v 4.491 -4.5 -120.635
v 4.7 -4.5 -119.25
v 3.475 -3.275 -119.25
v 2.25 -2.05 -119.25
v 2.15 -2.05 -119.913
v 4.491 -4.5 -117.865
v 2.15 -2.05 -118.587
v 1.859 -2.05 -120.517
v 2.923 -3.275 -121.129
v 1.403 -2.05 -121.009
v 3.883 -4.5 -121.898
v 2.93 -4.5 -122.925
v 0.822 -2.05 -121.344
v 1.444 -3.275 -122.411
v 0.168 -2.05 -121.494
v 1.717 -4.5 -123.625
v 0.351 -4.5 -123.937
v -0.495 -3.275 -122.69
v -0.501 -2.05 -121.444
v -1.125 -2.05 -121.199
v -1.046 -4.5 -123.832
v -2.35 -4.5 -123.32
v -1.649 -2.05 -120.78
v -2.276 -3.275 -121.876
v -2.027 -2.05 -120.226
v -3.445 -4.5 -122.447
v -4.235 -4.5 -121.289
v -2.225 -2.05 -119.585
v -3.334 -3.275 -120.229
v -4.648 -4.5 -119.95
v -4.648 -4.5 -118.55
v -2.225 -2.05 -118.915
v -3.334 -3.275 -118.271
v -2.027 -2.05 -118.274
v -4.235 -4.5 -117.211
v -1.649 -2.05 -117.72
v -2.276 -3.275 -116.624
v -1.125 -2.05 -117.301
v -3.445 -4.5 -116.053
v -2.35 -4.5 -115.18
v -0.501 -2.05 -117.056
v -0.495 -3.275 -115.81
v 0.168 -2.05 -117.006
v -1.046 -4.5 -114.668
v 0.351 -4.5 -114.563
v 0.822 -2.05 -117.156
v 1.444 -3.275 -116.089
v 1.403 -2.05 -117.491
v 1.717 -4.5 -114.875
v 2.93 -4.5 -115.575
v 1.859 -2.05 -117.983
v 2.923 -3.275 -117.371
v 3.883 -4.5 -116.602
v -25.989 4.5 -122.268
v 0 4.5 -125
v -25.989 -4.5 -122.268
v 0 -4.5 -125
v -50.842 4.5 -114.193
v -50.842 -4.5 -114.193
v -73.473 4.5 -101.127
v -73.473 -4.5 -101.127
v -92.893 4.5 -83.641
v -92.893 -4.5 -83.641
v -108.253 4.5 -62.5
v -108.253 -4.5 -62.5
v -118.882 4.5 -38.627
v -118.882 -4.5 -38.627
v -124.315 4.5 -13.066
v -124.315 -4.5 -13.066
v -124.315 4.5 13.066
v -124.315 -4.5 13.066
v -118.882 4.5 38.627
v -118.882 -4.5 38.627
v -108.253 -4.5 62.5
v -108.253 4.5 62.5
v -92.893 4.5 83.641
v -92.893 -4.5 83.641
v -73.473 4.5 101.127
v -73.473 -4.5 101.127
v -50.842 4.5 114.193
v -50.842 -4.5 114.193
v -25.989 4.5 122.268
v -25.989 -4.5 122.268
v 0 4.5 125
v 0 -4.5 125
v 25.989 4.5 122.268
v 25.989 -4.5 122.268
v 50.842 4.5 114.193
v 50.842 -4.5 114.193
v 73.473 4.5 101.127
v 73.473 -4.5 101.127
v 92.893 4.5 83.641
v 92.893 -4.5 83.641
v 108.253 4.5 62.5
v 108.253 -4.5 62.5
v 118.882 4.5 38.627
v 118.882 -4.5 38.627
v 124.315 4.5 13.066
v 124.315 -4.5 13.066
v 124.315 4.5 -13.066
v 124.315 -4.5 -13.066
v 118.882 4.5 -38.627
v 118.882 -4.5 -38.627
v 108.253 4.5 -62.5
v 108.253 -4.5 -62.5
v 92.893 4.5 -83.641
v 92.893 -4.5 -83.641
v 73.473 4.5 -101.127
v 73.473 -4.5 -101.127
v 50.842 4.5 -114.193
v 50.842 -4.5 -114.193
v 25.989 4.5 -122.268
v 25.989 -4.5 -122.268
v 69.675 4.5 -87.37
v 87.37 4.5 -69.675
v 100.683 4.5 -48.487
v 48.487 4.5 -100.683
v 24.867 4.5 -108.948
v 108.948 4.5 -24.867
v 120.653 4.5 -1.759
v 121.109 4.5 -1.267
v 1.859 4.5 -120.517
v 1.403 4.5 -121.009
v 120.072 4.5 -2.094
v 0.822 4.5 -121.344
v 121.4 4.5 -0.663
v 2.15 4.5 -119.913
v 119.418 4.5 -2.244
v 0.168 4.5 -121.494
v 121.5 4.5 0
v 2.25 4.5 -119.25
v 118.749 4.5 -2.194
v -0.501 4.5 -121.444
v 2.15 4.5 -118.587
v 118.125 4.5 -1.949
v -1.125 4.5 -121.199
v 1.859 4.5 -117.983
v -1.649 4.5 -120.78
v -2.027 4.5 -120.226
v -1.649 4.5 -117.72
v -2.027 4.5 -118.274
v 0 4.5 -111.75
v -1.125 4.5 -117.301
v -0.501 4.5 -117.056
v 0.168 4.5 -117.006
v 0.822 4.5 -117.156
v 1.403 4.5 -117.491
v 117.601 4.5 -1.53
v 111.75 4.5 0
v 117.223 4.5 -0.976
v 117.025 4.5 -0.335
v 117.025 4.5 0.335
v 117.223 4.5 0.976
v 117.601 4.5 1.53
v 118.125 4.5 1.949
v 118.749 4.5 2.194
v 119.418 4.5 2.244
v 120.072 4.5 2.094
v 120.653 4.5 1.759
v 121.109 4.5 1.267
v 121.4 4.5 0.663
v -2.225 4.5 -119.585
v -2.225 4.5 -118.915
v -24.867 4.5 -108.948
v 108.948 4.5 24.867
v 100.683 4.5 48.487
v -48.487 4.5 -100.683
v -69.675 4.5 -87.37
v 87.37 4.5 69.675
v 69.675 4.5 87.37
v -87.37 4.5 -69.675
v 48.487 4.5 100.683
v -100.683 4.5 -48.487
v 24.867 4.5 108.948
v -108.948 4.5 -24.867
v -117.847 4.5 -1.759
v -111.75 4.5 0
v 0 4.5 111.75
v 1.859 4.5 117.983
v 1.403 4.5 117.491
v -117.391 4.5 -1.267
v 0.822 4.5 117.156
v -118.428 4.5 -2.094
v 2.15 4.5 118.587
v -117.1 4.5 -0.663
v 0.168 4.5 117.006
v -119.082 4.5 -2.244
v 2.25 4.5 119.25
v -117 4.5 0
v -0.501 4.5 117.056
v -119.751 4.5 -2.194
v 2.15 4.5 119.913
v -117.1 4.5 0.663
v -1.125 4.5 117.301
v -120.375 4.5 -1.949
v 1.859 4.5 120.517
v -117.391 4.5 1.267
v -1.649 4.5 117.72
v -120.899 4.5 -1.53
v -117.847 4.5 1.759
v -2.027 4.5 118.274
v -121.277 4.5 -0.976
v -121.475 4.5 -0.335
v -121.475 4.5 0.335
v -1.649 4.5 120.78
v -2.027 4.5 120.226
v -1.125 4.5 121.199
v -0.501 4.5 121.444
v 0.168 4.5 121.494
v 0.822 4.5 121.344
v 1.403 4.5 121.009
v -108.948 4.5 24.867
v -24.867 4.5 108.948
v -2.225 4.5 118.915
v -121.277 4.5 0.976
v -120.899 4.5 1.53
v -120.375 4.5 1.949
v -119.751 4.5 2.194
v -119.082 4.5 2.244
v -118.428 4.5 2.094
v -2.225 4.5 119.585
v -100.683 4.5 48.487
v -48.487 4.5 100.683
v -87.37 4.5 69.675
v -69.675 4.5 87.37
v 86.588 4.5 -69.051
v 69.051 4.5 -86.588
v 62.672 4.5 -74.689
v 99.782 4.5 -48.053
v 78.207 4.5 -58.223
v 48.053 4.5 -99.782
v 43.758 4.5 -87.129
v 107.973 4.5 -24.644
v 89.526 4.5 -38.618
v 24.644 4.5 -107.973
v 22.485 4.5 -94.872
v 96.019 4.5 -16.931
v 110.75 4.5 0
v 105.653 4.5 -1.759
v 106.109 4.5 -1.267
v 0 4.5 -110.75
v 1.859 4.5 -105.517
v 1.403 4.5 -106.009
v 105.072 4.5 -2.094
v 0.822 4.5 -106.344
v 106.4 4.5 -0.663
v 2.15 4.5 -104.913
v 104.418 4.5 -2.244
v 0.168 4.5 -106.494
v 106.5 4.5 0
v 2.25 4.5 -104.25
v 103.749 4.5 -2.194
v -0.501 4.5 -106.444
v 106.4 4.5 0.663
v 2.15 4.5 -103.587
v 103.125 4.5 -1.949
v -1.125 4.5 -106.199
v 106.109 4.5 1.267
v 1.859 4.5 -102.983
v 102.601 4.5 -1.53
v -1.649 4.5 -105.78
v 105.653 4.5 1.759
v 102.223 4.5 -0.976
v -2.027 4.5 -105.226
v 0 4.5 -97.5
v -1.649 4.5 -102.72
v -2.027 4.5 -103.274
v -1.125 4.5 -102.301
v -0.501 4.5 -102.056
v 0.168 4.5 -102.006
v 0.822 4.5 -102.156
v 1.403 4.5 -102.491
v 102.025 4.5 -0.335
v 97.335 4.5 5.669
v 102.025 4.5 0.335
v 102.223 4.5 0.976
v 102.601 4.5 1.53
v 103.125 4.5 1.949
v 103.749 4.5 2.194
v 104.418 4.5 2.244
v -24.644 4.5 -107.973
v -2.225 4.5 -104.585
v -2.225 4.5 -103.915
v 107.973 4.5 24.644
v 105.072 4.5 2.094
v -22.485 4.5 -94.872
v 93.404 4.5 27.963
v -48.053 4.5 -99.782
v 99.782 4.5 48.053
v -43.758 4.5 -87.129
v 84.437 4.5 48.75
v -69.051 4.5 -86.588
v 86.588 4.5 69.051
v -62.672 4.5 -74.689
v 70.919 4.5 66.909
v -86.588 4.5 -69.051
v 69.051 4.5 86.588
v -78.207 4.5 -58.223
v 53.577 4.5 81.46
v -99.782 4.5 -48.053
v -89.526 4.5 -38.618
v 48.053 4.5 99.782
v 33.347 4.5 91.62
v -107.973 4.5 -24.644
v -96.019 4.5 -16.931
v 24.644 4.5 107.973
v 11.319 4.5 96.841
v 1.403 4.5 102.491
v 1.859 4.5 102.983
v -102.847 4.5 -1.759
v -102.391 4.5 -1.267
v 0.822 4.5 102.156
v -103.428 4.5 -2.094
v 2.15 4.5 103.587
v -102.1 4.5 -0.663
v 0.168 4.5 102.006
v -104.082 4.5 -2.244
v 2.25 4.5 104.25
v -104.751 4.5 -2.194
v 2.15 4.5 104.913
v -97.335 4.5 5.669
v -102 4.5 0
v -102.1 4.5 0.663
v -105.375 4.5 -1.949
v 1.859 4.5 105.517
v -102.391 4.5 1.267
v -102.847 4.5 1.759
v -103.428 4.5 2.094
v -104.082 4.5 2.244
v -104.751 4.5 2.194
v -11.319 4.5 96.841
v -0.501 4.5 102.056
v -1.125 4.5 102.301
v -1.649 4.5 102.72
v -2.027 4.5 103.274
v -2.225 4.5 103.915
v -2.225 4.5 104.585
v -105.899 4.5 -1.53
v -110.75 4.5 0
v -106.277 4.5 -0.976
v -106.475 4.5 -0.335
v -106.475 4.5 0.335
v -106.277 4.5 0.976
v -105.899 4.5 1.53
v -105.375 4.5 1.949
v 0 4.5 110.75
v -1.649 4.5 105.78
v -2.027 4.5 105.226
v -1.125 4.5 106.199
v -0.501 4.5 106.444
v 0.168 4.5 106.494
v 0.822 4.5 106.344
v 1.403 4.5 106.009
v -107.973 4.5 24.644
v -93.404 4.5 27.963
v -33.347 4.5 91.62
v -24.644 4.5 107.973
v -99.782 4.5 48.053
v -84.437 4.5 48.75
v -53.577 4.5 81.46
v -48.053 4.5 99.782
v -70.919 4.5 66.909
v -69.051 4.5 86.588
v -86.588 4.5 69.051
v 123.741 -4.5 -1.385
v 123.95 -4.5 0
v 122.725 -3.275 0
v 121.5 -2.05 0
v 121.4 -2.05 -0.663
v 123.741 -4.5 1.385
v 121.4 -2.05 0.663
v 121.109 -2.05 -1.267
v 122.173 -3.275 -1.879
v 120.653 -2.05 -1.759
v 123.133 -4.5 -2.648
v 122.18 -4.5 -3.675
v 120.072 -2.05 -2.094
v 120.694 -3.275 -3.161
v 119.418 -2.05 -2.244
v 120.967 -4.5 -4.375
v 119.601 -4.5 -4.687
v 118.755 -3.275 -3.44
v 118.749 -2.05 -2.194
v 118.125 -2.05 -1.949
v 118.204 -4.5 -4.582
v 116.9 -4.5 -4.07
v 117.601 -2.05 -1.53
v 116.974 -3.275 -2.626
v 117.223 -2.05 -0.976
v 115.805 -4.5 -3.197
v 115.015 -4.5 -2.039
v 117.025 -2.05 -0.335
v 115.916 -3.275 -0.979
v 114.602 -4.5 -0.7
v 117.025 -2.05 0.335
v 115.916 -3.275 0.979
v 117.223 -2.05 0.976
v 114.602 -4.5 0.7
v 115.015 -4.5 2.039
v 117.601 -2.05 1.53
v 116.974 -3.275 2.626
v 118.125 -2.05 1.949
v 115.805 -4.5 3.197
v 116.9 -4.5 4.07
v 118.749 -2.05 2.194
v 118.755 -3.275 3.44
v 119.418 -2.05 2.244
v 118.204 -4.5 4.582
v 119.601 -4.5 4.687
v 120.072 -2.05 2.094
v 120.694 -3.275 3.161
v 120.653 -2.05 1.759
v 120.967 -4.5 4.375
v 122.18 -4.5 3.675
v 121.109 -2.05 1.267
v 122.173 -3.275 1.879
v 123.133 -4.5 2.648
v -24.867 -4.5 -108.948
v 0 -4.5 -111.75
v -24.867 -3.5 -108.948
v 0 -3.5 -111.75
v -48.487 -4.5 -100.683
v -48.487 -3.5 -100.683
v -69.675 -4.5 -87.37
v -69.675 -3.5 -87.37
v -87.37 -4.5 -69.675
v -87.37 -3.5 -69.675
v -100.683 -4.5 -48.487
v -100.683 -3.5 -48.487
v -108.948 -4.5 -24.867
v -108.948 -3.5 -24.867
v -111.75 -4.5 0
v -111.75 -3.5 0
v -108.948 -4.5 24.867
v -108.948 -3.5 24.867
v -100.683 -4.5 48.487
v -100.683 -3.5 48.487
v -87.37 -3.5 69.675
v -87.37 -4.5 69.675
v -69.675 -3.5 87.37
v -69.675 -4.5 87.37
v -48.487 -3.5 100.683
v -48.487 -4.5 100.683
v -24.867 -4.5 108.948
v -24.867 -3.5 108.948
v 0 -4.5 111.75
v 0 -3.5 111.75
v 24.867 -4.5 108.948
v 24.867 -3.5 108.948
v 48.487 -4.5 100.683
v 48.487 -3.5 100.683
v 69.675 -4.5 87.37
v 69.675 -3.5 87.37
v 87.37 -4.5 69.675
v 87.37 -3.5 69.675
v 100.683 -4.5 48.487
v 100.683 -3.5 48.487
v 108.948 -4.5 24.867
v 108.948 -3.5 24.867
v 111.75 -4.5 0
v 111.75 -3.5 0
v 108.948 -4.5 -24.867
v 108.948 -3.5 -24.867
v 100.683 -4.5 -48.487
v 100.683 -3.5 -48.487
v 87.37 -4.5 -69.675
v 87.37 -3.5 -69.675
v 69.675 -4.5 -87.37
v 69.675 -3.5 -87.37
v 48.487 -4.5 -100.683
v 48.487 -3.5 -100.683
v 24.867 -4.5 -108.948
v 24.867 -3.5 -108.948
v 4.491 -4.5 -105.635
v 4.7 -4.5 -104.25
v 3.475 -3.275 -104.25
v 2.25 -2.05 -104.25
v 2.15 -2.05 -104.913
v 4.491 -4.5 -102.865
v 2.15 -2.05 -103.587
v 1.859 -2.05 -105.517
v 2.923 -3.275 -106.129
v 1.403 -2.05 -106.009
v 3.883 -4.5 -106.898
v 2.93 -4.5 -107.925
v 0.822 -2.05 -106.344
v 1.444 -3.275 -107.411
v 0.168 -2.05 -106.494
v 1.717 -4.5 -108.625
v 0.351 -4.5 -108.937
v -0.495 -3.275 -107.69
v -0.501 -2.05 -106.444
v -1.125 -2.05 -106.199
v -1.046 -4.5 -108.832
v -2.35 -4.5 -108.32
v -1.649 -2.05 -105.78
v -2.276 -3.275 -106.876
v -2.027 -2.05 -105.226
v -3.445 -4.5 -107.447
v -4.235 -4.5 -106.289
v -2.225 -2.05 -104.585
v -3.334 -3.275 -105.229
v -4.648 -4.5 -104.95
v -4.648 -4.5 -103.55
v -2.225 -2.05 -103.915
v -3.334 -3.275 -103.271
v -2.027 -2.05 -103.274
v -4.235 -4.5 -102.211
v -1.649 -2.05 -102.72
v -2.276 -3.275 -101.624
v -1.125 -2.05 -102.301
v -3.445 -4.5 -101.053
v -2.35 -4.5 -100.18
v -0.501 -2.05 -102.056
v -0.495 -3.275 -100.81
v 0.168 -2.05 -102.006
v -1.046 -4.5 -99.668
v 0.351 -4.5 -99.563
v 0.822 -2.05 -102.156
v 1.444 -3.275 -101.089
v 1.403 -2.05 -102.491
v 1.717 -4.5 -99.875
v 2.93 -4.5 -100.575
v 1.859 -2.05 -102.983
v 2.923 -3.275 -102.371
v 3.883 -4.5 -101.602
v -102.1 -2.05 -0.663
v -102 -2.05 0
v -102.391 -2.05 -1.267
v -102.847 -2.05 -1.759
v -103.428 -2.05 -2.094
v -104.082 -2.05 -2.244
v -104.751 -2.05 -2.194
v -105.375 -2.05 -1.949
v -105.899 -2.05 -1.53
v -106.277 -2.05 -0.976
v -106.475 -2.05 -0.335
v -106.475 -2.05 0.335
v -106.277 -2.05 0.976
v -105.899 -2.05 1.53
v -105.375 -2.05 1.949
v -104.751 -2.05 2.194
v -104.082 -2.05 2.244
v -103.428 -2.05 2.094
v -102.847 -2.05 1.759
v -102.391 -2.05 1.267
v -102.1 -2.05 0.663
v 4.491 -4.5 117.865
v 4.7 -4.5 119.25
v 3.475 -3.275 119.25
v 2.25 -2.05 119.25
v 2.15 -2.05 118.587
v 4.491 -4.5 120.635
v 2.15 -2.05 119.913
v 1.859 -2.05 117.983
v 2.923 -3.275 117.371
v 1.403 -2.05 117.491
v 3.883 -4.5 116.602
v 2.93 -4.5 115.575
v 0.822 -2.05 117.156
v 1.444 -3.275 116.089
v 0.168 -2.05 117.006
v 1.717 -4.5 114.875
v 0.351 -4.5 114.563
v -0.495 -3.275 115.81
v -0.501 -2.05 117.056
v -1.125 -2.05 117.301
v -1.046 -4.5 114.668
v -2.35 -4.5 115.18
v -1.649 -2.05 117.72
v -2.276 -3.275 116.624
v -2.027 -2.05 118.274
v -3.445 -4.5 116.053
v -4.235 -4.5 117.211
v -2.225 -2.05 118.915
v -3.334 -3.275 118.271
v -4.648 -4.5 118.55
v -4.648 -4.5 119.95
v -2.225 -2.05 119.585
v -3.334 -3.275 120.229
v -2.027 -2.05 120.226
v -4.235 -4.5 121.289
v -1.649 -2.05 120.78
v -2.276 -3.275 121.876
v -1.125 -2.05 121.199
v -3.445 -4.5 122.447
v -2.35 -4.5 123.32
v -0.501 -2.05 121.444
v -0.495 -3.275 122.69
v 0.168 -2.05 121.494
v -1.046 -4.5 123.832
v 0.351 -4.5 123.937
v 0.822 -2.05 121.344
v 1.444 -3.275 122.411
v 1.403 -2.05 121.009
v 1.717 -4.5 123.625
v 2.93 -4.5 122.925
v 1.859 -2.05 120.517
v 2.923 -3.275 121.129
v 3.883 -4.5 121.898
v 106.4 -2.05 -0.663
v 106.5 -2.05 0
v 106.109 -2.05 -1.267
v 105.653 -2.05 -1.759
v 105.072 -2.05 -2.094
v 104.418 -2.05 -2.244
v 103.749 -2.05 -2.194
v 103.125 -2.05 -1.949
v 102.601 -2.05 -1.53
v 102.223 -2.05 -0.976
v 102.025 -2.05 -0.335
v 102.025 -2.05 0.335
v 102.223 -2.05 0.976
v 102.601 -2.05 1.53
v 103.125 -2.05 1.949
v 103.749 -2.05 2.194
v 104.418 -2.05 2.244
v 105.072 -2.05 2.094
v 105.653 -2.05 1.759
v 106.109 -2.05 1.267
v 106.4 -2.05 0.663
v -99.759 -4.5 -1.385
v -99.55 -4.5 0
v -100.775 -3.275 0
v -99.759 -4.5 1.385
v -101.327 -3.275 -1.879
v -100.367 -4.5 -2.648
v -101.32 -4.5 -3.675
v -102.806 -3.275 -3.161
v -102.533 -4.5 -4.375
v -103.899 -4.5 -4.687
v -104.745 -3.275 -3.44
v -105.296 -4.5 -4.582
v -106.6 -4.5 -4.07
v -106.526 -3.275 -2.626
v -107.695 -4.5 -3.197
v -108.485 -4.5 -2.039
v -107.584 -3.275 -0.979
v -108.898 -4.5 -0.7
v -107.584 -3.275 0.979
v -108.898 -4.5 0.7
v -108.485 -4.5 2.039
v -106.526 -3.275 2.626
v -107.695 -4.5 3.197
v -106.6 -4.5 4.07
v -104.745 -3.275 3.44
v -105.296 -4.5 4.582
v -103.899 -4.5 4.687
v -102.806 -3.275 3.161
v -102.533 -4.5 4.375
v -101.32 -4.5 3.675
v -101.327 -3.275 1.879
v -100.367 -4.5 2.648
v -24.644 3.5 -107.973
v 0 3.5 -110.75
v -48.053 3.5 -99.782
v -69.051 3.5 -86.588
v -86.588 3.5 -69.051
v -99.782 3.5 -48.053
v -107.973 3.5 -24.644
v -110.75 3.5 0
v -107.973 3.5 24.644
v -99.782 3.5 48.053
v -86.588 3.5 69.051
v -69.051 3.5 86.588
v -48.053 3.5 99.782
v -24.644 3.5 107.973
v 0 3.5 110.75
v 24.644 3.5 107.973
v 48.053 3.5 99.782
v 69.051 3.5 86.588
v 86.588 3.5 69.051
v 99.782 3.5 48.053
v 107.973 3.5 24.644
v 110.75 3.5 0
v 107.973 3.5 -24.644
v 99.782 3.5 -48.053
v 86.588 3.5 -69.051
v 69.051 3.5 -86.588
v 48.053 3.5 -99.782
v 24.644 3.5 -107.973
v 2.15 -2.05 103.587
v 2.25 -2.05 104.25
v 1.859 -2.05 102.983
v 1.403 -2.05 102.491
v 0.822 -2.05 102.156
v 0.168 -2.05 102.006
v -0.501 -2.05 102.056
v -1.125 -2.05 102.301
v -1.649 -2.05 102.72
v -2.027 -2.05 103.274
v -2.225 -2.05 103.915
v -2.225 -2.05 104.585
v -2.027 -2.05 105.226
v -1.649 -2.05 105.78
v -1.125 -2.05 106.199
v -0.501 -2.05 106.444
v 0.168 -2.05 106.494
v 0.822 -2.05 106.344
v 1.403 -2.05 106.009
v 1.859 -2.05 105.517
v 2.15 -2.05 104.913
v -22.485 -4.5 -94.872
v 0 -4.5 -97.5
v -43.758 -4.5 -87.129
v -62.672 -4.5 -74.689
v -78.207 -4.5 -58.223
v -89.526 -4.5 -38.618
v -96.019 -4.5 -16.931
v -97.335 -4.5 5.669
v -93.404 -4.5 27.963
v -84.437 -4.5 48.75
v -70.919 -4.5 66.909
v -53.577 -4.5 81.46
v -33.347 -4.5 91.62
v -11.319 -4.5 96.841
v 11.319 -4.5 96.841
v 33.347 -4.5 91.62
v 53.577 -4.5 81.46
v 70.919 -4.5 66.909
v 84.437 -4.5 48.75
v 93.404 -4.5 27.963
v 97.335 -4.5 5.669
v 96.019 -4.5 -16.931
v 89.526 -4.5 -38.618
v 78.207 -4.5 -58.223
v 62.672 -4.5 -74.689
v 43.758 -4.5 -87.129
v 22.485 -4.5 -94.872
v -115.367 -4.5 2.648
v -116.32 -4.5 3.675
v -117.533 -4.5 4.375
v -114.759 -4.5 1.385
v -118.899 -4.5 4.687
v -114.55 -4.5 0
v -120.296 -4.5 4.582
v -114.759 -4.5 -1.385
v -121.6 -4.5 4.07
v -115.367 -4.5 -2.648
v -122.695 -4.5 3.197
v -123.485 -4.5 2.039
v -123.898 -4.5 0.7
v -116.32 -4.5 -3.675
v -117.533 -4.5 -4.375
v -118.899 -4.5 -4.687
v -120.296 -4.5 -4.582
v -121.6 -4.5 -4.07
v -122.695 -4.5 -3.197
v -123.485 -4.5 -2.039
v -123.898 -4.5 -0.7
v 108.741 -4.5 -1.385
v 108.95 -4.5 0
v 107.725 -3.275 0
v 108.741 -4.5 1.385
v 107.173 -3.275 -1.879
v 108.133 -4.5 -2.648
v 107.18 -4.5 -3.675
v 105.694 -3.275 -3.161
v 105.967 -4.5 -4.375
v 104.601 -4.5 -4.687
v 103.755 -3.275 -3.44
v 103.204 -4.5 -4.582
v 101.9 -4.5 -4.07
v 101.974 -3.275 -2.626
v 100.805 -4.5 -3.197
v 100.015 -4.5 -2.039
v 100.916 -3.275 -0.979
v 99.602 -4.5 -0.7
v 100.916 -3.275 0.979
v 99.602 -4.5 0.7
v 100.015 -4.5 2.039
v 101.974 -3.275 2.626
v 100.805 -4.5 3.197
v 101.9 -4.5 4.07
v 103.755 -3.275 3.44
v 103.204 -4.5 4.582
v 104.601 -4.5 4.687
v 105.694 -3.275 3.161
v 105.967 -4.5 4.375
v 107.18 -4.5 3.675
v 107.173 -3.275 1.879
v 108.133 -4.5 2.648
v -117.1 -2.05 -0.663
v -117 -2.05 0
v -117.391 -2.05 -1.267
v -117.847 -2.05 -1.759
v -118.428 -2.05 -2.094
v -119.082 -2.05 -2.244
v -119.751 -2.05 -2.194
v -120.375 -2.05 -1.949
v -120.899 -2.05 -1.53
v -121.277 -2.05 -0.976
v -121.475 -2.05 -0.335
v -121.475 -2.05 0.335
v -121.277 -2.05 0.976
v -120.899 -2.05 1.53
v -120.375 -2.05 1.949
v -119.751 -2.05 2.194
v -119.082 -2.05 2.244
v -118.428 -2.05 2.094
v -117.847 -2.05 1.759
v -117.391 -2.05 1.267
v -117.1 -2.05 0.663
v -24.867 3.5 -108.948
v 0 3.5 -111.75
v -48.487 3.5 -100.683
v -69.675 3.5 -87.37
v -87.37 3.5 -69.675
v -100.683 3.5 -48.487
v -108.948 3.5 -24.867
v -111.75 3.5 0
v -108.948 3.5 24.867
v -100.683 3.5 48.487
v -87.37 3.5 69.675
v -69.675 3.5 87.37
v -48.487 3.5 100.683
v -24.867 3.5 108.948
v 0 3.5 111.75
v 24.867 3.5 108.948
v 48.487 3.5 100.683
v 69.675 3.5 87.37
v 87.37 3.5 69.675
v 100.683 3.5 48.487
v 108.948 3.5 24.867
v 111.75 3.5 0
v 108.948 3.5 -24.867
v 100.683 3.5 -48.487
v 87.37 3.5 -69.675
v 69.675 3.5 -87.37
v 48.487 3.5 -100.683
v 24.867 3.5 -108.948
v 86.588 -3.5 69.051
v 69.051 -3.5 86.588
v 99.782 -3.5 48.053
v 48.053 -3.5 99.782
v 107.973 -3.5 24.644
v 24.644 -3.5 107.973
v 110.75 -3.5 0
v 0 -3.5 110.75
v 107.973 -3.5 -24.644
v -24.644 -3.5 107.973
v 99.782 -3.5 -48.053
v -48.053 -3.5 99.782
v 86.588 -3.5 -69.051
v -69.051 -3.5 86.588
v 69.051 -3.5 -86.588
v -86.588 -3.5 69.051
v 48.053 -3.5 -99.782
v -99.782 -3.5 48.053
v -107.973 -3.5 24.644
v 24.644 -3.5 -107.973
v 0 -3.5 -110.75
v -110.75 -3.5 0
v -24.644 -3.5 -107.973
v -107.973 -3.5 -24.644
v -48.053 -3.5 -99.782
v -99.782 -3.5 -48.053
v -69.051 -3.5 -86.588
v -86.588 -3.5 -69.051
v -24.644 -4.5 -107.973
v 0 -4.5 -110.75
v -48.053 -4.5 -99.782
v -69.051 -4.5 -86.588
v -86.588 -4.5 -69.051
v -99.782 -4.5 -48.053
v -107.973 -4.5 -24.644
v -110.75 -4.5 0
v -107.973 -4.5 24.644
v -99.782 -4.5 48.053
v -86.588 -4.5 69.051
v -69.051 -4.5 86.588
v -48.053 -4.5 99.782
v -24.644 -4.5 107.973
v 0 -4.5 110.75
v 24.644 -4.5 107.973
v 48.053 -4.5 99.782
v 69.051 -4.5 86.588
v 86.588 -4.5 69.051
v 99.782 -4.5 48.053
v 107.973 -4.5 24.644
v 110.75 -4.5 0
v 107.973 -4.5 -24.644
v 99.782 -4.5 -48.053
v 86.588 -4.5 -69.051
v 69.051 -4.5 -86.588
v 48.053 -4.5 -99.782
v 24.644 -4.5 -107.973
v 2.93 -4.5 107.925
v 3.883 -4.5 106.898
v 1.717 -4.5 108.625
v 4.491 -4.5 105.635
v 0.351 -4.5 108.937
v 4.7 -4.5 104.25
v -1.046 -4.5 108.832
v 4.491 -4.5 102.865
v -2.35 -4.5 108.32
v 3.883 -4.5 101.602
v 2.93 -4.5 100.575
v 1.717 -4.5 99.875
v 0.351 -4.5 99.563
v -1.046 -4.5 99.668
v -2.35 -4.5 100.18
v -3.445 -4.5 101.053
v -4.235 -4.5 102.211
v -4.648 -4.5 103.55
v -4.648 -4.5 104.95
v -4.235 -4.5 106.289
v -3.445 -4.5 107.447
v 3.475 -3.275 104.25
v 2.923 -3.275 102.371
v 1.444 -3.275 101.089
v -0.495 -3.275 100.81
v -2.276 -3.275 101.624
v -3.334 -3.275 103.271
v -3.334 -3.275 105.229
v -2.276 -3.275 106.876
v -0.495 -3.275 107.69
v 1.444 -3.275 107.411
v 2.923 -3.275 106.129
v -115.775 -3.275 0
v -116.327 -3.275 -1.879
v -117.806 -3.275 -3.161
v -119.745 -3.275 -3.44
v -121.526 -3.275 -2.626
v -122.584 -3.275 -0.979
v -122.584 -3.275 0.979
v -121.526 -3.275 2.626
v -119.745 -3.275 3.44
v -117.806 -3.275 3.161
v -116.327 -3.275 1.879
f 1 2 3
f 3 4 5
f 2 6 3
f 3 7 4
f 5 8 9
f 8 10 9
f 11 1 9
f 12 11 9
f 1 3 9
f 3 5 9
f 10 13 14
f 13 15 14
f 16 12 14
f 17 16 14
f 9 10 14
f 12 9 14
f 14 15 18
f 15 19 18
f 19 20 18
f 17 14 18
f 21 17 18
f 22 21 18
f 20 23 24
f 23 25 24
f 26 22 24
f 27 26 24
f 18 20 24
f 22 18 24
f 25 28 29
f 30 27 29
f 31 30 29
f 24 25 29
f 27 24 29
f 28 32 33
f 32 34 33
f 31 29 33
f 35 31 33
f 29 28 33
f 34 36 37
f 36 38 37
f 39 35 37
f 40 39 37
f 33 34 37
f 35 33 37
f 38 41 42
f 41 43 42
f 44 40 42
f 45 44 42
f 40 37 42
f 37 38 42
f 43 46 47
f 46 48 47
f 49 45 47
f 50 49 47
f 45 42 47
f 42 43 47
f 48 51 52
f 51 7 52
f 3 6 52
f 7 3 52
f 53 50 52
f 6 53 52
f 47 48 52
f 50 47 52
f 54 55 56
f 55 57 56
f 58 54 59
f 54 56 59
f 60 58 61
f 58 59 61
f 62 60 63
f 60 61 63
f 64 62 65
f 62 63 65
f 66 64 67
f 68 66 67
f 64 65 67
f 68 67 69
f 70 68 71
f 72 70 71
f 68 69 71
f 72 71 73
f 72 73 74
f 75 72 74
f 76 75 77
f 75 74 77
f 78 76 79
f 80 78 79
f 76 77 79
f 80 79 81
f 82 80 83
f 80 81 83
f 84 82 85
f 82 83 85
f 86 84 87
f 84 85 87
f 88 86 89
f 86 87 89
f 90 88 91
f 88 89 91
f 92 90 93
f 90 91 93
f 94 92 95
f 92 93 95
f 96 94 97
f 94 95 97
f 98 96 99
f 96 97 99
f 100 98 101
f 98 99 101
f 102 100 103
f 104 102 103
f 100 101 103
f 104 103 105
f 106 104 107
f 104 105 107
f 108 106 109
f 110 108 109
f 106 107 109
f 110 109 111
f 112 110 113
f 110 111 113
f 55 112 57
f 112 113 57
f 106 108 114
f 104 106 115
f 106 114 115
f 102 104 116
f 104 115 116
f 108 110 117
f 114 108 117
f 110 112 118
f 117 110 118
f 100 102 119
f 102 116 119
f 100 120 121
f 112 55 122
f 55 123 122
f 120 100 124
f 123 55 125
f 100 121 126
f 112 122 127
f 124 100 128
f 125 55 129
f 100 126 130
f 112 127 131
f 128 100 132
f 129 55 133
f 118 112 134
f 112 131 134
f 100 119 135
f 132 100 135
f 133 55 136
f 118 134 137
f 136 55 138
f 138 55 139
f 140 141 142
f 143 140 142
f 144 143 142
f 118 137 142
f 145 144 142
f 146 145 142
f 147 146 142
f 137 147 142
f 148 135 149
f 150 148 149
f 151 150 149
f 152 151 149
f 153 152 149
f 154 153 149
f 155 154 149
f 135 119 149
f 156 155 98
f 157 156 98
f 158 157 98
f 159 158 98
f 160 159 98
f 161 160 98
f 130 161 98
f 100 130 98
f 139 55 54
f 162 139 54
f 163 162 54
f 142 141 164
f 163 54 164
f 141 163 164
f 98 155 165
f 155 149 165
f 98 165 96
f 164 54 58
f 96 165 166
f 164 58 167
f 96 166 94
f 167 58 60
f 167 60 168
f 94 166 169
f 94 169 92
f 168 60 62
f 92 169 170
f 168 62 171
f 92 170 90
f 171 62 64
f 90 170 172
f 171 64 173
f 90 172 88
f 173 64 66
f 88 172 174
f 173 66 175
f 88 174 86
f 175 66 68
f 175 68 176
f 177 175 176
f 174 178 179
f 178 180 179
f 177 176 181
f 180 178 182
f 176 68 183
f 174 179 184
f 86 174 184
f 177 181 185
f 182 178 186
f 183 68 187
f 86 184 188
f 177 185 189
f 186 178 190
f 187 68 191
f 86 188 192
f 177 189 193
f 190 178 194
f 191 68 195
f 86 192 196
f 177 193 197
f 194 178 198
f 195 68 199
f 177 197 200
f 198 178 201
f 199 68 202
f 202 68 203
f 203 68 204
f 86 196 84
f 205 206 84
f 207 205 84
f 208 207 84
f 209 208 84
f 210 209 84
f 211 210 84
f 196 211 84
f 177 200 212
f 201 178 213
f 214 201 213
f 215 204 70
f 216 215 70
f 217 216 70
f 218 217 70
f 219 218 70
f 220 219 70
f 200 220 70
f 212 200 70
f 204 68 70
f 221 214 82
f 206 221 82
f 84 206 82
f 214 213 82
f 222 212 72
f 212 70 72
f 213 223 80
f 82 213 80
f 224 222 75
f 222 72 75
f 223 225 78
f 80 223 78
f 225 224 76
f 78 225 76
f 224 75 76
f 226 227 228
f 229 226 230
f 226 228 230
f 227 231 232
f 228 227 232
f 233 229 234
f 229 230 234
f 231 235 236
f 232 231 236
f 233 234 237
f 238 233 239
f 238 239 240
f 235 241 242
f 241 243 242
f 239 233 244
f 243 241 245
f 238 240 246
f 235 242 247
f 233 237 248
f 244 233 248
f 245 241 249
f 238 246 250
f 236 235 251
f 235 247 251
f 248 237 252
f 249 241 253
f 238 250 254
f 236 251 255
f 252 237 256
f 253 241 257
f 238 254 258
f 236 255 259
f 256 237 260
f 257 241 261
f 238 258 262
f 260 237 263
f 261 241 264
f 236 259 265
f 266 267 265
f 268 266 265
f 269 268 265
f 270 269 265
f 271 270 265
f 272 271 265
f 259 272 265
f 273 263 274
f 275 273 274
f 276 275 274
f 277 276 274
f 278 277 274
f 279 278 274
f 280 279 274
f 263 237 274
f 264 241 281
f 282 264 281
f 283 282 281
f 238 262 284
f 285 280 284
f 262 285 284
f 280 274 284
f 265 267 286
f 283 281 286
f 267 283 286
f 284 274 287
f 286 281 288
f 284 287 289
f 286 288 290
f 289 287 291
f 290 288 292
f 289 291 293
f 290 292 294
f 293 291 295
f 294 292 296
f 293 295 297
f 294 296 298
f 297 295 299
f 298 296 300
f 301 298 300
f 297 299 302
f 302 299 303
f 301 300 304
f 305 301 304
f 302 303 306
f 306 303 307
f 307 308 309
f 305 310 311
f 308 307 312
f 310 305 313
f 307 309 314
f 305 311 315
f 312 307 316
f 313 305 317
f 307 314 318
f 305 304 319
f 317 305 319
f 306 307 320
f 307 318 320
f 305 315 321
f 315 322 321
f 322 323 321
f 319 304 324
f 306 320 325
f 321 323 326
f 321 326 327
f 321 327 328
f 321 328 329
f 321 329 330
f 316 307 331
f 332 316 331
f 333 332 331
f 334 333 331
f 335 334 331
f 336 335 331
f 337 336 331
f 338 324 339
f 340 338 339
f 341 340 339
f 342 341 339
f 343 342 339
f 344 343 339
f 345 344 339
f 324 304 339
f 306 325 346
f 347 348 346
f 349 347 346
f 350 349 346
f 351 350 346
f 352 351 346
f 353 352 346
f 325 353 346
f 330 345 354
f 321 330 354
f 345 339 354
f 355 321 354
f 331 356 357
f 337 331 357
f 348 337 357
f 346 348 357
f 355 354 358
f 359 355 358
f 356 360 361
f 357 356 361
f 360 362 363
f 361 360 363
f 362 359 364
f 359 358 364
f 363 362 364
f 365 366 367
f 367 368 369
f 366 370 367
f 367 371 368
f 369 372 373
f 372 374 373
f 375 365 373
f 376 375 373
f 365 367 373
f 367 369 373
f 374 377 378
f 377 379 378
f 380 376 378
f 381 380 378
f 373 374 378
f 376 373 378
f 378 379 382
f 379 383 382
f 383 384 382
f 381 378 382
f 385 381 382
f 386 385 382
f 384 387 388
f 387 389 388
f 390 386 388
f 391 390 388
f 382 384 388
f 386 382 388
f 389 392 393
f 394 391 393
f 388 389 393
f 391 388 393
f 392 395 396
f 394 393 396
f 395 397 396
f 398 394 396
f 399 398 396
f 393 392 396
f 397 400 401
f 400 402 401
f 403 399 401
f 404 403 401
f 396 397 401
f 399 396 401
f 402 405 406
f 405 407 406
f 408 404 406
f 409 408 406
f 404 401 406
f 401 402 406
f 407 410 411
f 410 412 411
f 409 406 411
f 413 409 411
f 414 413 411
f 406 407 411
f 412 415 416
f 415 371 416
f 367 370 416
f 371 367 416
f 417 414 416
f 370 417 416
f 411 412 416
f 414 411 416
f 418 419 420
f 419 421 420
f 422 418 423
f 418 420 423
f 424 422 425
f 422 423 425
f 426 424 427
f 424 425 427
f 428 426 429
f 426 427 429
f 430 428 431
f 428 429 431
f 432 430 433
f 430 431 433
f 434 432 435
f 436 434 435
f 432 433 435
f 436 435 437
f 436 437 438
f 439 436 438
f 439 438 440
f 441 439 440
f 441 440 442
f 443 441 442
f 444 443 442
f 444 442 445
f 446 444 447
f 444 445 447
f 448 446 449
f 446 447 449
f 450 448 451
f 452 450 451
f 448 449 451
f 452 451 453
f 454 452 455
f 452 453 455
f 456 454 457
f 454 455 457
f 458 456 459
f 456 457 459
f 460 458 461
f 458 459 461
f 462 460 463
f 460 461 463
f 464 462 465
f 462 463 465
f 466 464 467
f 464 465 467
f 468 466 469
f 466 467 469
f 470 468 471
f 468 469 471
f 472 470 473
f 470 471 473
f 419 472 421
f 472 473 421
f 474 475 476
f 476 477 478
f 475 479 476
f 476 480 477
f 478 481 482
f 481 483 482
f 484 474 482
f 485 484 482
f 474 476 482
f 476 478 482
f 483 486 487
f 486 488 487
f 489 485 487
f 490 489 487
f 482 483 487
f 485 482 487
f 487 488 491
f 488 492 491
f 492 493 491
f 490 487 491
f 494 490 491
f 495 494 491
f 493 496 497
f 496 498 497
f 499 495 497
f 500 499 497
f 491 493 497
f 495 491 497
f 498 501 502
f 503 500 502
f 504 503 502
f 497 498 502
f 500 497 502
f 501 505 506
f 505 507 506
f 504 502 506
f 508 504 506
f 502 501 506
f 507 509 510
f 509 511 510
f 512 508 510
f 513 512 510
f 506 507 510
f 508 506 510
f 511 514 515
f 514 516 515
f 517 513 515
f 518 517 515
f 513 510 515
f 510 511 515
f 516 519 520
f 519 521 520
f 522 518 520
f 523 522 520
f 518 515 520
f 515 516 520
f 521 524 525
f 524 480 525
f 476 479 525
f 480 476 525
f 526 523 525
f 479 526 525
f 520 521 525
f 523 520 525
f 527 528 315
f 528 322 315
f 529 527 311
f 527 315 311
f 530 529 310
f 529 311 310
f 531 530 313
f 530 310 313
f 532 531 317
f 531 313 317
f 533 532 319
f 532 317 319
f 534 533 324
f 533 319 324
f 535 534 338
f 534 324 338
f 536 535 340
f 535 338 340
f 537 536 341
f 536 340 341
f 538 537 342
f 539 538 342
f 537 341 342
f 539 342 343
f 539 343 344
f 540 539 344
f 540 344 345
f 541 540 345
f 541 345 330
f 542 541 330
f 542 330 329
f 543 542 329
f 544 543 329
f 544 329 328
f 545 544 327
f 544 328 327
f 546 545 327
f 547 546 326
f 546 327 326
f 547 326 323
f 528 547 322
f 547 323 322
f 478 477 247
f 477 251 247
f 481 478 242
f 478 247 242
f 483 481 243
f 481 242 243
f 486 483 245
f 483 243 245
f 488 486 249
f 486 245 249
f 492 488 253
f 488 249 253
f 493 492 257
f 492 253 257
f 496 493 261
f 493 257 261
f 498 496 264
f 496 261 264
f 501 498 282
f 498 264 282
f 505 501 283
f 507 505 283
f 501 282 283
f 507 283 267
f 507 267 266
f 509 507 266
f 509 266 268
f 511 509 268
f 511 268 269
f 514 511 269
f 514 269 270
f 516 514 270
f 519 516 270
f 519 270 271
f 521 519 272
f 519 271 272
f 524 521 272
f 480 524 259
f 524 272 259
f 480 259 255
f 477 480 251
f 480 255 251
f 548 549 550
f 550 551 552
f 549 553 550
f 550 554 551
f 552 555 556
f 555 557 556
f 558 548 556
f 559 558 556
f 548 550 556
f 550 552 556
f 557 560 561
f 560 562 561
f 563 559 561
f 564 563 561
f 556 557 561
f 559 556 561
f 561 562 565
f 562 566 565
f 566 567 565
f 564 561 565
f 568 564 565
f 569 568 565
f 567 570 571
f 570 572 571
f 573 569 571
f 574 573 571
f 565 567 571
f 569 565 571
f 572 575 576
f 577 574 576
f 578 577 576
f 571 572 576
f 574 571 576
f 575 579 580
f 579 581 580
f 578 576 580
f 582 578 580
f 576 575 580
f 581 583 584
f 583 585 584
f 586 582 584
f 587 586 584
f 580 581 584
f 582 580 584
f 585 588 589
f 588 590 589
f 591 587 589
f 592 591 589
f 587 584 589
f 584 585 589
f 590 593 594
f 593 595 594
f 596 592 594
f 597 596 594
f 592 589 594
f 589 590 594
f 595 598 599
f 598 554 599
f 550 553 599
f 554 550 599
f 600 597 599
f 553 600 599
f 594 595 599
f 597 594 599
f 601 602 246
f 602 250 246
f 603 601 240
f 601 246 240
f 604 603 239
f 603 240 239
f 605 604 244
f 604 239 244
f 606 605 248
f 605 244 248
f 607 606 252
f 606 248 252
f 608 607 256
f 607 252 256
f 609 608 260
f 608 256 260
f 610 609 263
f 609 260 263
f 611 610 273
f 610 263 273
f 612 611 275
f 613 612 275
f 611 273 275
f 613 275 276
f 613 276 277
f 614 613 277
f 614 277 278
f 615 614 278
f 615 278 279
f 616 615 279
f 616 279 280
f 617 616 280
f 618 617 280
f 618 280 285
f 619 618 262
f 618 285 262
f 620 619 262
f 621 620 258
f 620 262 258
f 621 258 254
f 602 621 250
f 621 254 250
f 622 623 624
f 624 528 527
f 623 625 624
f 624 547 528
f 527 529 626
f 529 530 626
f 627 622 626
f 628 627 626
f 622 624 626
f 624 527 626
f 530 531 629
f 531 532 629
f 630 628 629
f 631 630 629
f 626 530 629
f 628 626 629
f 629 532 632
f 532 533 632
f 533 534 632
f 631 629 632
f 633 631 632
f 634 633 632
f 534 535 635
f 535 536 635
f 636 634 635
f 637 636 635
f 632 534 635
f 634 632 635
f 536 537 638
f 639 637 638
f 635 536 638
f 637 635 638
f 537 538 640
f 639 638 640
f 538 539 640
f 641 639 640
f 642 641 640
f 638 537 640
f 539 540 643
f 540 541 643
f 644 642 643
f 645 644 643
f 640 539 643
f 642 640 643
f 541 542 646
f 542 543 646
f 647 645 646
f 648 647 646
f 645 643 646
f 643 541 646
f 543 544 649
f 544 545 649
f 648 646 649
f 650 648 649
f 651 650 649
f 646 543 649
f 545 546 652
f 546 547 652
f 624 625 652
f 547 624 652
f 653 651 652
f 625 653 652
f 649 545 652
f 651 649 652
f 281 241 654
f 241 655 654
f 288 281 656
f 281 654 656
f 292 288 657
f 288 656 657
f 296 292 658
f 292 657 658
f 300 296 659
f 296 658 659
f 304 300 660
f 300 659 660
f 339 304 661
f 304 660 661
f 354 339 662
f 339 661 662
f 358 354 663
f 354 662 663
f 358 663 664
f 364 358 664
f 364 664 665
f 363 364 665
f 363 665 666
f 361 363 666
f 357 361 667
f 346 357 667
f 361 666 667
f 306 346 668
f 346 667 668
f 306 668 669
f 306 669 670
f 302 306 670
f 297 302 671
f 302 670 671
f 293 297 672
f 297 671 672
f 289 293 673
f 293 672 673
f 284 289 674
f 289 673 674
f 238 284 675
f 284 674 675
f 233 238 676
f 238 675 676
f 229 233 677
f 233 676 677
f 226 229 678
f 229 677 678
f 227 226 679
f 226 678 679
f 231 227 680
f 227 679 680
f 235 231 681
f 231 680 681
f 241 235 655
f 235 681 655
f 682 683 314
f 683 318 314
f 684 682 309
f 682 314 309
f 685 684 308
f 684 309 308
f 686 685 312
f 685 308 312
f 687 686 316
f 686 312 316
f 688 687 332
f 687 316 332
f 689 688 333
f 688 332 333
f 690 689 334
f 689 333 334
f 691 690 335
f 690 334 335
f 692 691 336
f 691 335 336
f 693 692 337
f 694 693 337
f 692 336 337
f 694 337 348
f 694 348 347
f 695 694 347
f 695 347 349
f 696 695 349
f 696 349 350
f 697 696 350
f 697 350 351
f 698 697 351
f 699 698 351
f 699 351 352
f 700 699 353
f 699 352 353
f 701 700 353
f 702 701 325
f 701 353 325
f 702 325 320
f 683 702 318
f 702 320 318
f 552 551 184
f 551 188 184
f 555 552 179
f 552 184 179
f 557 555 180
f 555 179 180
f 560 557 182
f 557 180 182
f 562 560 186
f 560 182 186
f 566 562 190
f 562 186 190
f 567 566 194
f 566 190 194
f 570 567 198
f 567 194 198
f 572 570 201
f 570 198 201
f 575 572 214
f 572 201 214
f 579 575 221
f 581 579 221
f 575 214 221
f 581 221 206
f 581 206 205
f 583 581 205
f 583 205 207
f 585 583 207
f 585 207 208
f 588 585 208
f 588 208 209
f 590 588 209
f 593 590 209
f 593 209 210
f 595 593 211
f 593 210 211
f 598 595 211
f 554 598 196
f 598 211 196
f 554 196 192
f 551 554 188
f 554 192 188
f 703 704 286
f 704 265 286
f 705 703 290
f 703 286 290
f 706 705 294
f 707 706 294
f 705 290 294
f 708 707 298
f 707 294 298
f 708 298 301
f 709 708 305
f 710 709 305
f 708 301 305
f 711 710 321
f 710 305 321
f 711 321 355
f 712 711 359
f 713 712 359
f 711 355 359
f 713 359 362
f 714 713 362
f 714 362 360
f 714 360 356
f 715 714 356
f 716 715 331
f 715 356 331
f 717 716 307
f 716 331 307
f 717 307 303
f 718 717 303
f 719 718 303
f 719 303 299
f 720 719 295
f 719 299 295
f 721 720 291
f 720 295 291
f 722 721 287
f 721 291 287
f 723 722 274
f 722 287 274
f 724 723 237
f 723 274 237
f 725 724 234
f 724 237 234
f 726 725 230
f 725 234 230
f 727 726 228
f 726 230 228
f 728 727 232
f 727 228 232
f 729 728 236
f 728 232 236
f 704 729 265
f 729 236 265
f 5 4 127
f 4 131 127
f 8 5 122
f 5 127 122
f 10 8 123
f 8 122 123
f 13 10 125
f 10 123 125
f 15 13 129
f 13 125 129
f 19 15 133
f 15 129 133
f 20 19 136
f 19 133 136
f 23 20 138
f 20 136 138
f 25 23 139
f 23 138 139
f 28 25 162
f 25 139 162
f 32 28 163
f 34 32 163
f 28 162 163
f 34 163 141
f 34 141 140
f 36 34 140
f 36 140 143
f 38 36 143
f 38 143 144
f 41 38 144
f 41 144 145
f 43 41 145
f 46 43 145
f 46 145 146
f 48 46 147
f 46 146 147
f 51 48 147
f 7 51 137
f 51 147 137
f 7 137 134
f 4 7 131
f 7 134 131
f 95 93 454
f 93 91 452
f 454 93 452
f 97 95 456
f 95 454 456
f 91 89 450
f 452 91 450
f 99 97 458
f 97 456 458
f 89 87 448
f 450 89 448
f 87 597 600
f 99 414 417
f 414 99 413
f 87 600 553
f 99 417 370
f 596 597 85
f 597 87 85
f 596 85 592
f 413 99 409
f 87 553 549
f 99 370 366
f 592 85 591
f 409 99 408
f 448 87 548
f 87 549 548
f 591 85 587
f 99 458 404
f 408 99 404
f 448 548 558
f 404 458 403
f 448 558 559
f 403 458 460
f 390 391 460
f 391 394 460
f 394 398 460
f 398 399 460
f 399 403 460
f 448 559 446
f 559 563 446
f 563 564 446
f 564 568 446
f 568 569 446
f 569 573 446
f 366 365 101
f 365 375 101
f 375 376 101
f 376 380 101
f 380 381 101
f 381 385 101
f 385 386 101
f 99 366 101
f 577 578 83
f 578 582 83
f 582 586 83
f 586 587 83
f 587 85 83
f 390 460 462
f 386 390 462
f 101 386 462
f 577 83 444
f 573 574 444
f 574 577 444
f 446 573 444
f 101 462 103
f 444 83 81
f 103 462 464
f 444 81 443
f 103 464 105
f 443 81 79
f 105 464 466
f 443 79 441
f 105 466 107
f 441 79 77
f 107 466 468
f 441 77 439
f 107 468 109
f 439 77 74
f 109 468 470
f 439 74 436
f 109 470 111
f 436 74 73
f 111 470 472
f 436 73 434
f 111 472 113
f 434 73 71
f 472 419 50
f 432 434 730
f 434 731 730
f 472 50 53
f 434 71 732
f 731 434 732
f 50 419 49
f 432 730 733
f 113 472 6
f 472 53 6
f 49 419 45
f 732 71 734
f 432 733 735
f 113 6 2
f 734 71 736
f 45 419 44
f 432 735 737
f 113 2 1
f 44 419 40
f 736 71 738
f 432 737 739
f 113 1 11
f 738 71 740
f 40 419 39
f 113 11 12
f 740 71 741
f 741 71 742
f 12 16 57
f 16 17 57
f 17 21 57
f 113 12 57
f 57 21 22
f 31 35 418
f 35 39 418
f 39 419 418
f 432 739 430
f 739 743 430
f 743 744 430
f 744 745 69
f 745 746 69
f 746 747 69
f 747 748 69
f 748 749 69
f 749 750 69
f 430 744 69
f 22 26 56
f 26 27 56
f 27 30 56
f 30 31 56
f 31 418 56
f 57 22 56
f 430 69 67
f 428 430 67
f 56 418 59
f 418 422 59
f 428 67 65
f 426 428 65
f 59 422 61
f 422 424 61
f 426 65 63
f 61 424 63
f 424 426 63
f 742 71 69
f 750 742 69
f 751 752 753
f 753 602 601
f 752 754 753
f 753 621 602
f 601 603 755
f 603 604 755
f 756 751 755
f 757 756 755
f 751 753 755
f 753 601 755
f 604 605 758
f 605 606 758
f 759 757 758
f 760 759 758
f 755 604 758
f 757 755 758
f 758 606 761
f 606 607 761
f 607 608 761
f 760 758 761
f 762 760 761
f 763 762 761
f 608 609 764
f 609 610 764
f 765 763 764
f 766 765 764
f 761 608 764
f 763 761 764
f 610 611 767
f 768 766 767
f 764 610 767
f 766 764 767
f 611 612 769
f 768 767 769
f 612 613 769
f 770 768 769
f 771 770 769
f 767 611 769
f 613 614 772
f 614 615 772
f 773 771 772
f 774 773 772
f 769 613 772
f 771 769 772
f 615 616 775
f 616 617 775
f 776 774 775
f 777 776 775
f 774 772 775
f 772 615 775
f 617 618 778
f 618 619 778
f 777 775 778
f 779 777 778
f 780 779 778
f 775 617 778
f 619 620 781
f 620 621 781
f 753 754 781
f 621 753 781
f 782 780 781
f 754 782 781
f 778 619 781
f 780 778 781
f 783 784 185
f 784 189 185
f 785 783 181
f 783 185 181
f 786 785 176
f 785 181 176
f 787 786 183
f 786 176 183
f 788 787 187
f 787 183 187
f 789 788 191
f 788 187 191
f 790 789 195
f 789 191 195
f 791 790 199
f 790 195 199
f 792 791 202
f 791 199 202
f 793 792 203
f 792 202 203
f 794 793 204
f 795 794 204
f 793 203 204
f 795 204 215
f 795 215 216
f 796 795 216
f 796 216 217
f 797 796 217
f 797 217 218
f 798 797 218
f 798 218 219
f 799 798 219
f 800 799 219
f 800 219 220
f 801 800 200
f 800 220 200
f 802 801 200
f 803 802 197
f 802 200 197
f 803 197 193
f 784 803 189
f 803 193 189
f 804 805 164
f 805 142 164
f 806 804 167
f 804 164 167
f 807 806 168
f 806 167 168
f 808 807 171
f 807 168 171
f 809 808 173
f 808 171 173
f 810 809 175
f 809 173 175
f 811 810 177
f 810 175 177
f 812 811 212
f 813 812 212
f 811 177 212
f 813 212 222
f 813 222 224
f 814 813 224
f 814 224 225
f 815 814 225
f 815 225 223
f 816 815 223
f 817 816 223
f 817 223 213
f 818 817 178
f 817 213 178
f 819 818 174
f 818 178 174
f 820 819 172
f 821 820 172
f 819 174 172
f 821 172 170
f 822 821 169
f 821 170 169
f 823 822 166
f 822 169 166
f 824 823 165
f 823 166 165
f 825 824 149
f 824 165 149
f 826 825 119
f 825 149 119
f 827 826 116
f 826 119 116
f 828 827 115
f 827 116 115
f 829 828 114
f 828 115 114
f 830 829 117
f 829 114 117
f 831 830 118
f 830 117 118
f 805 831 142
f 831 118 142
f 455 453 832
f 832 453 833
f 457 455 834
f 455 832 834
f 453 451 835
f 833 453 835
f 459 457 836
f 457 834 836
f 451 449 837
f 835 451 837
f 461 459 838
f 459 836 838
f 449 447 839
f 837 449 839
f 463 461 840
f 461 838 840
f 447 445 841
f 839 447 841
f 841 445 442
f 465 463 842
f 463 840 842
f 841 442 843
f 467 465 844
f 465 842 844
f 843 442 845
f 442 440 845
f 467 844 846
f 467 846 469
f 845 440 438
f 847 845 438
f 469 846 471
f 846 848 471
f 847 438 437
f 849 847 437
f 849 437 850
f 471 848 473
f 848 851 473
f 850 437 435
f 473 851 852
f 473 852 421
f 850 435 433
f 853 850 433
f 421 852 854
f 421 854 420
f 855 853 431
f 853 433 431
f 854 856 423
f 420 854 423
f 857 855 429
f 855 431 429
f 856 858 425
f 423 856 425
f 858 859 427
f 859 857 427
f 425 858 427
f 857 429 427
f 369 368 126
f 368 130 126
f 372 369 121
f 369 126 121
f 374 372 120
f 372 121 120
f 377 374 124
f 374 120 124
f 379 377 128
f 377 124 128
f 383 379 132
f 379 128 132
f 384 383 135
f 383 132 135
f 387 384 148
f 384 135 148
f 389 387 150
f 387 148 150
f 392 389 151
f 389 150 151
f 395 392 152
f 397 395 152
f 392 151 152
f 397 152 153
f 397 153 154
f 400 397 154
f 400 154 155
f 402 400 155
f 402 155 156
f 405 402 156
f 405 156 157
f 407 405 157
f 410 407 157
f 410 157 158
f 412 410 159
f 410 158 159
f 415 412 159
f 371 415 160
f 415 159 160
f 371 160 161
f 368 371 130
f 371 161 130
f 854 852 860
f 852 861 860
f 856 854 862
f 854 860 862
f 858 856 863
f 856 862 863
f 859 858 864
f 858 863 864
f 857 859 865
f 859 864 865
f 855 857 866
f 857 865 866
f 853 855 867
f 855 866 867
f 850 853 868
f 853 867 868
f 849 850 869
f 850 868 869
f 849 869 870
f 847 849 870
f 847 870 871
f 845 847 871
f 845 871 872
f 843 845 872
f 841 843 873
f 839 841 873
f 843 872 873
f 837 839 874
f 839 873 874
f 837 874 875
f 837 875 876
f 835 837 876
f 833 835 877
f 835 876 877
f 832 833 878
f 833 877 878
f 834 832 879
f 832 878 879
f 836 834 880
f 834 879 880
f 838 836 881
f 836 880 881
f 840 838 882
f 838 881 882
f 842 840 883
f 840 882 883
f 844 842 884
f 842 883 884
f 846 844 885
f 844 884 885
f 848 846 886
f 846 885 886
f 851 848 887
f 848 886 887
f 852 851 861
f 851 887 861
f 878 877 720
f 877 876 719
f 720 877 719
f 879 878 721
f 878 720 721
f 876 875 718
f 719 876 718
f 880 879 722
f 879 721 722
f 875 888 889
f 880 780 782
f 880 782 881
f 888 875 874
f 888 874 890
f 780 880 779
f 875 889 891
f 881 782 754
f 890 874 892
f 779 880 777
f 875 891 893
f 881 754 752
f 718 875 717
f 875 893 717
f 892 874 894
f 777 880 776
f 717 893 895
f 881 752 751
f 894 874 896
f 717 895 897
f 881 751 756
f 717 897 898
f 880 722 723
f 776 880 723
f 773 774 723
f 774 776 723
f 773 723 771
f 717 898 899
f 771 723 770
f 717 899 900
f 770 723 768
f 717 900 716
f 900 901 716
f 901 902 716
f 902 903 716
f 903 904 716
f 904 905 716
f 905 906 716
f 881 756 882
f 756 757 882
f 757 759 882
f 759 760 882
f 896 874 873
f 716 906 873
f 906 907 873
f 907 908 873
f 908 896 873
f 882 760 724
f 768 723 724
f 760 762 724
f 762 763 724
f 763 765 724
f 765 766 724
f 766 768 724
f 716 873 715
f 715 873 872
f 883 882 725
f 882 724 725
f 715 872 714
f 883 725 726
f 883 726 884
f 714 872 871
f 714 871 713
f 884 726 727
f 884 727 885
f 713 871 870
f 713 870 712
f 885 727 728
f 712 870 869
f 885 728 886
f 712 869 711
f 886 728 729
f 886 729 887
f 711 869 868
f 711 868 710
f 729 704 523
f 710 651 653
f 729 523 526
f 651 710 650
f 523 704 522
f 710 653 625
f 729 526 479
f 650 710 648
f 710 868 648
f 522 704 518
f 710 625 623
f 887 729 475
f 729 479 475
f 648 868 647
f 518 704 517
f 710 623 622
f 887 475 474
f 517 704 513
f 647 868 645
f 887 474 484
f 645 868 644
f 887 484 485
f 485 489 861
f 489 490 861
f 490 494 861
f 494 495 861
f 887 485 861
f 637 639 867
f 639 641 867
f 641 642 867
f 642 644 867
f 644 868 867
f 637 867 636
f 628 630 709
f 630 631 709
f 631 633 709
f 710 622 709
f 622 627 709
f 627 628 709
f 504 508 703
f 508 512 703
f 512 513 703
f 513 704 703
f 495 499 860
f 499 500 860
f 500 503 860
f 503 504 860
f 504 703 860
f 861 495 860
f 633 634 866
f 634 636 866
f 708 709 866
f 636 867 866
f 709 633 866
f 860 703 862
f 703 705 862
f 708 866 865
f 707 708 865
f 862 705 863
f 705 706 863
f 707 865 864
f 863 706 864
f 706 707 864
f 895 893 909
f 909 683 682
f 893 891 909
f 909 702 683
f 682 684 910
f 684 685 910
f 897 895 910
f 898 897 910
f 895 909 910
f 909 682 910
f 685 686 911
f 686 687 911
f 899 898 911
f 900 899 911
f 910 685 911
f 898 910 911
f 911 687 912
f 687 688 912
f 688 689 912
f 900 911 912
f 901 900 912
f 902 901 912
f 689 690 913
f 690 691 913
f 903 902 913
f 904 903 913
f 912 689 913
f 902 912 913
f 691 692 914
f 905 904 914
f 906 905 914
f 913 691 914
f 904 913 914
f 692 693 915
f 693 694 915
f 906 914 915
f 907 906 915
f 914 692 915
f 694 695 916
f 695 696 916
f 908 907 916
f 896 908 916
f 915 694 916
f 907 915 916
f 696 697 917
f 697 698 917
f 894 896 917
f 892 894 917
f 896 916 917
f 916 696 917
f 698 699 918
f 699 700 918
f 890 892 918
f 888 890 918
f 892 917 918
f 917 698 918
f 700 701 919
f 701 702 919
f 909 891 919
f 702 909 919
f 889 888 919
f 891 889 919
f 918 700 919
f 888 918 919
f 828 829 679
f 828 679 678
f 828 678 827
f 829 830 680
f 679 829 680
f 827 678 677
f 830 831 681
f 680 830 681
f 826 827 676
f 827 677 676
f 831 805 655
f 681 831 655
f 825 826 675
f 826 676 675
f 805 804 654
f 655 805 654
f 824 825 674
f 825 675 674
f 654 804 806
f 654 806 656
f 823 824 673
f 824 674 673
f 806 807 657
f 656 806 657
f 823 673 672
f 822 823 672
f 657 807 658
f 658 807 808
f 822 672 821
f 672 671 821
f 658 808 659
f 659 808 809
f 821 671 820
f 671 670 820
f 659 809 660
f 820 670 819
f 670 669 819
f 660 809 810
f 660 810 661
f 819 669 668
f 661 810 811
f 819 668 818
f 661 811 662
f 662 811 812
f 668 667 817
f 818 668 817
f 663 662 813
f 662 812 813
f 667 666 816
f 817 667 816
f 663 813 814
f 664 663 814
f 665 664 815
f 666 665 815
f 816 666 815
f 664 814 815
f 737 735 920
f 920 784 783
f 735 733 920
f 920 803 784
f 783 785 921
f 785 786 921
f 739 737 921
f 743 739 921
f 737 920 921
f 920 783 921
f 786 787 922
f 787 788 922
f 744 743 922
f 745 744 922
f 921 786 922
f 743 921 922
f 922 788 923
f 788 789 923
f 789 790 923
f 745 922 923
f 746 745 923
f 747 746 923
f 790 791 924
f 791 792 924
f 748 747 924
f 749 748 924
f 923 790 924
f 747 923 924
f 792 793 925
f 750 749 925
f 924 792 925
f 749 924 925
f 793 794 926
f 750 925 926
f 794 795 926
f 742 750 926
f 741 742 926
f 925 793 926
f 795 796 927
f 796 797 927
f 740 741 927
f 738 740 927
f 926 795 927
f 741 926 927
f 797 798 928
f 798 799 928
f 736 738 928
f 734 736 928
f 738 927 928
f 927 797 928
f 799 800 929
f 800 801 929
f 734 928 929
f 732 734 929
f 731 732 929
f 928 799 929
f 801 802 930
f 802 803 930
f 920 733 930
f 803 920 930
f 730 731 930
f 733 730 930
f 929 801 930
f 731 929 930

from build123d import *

# Parameters (mm, degrees)
CSK_FOR_M4_FLAT_HEAD_MACHINE_SCREW1_D           = 4.5
CSK_FOR_M4_FLAT_HEAD_MACHINE_SCREW1_CSINK_D     = 9.4
CSK_FOR_M4_FLAT_HEAD_MACHINE_SCREW1_CSINK_ANGLE = 90


with BuildPart() as part:
    # Sketch1 → Revolve1 (revolve)
    with BuildSketch(Plane.XY, mode=Mode.PRIVATE) as revolve1_sk:
        Polygon((-97.5, -4.5), (-97.5, 4.5), (-110.75, 4.5), (-110.75, 3.5), (-111.75, 3.5), (-111.75, 4.5), (-125, 4.5), (-125, -4.5), (-111.75, -4.5), (-111.75, -3.5), (-110.75, -3.5), (-110.75, -4.5), align=None)
    revolve(revolve1_sk.sketch.rotate(Axis((0, 0, 0), (0, 1, 0)), 270), axis=Axis((0, 0, 0), (0, 1, 0)))

    # CSK for M4 Flat Head Machine Screw1 (through all)
    with Locations(Plane(origin=(0, -4.5, 0), x_dir=(-1, 0, 0), z_dir=(0, -1, 0))):
        with Locations((-119.25, 0), (0, 104.25), (0, 119.25), (104.25, 0), (119.25, 0), (0, -104.25), (0, -119.25), (-104.25, 0)):
            CounterSinkHole(CSK_FOR_M4_FLAT_HEAD_MACHINE_SCREW1_D / 2, CSK_FOR_M4_FLAT_HEAD_MACHINE_SCREW1_CSINK_D / 2, counter_sink_angle=CSK_FOR_M4_FLAT_HEAD_MACHINE_SCREW1_CSINK_ANGLE)


solid = part.part
